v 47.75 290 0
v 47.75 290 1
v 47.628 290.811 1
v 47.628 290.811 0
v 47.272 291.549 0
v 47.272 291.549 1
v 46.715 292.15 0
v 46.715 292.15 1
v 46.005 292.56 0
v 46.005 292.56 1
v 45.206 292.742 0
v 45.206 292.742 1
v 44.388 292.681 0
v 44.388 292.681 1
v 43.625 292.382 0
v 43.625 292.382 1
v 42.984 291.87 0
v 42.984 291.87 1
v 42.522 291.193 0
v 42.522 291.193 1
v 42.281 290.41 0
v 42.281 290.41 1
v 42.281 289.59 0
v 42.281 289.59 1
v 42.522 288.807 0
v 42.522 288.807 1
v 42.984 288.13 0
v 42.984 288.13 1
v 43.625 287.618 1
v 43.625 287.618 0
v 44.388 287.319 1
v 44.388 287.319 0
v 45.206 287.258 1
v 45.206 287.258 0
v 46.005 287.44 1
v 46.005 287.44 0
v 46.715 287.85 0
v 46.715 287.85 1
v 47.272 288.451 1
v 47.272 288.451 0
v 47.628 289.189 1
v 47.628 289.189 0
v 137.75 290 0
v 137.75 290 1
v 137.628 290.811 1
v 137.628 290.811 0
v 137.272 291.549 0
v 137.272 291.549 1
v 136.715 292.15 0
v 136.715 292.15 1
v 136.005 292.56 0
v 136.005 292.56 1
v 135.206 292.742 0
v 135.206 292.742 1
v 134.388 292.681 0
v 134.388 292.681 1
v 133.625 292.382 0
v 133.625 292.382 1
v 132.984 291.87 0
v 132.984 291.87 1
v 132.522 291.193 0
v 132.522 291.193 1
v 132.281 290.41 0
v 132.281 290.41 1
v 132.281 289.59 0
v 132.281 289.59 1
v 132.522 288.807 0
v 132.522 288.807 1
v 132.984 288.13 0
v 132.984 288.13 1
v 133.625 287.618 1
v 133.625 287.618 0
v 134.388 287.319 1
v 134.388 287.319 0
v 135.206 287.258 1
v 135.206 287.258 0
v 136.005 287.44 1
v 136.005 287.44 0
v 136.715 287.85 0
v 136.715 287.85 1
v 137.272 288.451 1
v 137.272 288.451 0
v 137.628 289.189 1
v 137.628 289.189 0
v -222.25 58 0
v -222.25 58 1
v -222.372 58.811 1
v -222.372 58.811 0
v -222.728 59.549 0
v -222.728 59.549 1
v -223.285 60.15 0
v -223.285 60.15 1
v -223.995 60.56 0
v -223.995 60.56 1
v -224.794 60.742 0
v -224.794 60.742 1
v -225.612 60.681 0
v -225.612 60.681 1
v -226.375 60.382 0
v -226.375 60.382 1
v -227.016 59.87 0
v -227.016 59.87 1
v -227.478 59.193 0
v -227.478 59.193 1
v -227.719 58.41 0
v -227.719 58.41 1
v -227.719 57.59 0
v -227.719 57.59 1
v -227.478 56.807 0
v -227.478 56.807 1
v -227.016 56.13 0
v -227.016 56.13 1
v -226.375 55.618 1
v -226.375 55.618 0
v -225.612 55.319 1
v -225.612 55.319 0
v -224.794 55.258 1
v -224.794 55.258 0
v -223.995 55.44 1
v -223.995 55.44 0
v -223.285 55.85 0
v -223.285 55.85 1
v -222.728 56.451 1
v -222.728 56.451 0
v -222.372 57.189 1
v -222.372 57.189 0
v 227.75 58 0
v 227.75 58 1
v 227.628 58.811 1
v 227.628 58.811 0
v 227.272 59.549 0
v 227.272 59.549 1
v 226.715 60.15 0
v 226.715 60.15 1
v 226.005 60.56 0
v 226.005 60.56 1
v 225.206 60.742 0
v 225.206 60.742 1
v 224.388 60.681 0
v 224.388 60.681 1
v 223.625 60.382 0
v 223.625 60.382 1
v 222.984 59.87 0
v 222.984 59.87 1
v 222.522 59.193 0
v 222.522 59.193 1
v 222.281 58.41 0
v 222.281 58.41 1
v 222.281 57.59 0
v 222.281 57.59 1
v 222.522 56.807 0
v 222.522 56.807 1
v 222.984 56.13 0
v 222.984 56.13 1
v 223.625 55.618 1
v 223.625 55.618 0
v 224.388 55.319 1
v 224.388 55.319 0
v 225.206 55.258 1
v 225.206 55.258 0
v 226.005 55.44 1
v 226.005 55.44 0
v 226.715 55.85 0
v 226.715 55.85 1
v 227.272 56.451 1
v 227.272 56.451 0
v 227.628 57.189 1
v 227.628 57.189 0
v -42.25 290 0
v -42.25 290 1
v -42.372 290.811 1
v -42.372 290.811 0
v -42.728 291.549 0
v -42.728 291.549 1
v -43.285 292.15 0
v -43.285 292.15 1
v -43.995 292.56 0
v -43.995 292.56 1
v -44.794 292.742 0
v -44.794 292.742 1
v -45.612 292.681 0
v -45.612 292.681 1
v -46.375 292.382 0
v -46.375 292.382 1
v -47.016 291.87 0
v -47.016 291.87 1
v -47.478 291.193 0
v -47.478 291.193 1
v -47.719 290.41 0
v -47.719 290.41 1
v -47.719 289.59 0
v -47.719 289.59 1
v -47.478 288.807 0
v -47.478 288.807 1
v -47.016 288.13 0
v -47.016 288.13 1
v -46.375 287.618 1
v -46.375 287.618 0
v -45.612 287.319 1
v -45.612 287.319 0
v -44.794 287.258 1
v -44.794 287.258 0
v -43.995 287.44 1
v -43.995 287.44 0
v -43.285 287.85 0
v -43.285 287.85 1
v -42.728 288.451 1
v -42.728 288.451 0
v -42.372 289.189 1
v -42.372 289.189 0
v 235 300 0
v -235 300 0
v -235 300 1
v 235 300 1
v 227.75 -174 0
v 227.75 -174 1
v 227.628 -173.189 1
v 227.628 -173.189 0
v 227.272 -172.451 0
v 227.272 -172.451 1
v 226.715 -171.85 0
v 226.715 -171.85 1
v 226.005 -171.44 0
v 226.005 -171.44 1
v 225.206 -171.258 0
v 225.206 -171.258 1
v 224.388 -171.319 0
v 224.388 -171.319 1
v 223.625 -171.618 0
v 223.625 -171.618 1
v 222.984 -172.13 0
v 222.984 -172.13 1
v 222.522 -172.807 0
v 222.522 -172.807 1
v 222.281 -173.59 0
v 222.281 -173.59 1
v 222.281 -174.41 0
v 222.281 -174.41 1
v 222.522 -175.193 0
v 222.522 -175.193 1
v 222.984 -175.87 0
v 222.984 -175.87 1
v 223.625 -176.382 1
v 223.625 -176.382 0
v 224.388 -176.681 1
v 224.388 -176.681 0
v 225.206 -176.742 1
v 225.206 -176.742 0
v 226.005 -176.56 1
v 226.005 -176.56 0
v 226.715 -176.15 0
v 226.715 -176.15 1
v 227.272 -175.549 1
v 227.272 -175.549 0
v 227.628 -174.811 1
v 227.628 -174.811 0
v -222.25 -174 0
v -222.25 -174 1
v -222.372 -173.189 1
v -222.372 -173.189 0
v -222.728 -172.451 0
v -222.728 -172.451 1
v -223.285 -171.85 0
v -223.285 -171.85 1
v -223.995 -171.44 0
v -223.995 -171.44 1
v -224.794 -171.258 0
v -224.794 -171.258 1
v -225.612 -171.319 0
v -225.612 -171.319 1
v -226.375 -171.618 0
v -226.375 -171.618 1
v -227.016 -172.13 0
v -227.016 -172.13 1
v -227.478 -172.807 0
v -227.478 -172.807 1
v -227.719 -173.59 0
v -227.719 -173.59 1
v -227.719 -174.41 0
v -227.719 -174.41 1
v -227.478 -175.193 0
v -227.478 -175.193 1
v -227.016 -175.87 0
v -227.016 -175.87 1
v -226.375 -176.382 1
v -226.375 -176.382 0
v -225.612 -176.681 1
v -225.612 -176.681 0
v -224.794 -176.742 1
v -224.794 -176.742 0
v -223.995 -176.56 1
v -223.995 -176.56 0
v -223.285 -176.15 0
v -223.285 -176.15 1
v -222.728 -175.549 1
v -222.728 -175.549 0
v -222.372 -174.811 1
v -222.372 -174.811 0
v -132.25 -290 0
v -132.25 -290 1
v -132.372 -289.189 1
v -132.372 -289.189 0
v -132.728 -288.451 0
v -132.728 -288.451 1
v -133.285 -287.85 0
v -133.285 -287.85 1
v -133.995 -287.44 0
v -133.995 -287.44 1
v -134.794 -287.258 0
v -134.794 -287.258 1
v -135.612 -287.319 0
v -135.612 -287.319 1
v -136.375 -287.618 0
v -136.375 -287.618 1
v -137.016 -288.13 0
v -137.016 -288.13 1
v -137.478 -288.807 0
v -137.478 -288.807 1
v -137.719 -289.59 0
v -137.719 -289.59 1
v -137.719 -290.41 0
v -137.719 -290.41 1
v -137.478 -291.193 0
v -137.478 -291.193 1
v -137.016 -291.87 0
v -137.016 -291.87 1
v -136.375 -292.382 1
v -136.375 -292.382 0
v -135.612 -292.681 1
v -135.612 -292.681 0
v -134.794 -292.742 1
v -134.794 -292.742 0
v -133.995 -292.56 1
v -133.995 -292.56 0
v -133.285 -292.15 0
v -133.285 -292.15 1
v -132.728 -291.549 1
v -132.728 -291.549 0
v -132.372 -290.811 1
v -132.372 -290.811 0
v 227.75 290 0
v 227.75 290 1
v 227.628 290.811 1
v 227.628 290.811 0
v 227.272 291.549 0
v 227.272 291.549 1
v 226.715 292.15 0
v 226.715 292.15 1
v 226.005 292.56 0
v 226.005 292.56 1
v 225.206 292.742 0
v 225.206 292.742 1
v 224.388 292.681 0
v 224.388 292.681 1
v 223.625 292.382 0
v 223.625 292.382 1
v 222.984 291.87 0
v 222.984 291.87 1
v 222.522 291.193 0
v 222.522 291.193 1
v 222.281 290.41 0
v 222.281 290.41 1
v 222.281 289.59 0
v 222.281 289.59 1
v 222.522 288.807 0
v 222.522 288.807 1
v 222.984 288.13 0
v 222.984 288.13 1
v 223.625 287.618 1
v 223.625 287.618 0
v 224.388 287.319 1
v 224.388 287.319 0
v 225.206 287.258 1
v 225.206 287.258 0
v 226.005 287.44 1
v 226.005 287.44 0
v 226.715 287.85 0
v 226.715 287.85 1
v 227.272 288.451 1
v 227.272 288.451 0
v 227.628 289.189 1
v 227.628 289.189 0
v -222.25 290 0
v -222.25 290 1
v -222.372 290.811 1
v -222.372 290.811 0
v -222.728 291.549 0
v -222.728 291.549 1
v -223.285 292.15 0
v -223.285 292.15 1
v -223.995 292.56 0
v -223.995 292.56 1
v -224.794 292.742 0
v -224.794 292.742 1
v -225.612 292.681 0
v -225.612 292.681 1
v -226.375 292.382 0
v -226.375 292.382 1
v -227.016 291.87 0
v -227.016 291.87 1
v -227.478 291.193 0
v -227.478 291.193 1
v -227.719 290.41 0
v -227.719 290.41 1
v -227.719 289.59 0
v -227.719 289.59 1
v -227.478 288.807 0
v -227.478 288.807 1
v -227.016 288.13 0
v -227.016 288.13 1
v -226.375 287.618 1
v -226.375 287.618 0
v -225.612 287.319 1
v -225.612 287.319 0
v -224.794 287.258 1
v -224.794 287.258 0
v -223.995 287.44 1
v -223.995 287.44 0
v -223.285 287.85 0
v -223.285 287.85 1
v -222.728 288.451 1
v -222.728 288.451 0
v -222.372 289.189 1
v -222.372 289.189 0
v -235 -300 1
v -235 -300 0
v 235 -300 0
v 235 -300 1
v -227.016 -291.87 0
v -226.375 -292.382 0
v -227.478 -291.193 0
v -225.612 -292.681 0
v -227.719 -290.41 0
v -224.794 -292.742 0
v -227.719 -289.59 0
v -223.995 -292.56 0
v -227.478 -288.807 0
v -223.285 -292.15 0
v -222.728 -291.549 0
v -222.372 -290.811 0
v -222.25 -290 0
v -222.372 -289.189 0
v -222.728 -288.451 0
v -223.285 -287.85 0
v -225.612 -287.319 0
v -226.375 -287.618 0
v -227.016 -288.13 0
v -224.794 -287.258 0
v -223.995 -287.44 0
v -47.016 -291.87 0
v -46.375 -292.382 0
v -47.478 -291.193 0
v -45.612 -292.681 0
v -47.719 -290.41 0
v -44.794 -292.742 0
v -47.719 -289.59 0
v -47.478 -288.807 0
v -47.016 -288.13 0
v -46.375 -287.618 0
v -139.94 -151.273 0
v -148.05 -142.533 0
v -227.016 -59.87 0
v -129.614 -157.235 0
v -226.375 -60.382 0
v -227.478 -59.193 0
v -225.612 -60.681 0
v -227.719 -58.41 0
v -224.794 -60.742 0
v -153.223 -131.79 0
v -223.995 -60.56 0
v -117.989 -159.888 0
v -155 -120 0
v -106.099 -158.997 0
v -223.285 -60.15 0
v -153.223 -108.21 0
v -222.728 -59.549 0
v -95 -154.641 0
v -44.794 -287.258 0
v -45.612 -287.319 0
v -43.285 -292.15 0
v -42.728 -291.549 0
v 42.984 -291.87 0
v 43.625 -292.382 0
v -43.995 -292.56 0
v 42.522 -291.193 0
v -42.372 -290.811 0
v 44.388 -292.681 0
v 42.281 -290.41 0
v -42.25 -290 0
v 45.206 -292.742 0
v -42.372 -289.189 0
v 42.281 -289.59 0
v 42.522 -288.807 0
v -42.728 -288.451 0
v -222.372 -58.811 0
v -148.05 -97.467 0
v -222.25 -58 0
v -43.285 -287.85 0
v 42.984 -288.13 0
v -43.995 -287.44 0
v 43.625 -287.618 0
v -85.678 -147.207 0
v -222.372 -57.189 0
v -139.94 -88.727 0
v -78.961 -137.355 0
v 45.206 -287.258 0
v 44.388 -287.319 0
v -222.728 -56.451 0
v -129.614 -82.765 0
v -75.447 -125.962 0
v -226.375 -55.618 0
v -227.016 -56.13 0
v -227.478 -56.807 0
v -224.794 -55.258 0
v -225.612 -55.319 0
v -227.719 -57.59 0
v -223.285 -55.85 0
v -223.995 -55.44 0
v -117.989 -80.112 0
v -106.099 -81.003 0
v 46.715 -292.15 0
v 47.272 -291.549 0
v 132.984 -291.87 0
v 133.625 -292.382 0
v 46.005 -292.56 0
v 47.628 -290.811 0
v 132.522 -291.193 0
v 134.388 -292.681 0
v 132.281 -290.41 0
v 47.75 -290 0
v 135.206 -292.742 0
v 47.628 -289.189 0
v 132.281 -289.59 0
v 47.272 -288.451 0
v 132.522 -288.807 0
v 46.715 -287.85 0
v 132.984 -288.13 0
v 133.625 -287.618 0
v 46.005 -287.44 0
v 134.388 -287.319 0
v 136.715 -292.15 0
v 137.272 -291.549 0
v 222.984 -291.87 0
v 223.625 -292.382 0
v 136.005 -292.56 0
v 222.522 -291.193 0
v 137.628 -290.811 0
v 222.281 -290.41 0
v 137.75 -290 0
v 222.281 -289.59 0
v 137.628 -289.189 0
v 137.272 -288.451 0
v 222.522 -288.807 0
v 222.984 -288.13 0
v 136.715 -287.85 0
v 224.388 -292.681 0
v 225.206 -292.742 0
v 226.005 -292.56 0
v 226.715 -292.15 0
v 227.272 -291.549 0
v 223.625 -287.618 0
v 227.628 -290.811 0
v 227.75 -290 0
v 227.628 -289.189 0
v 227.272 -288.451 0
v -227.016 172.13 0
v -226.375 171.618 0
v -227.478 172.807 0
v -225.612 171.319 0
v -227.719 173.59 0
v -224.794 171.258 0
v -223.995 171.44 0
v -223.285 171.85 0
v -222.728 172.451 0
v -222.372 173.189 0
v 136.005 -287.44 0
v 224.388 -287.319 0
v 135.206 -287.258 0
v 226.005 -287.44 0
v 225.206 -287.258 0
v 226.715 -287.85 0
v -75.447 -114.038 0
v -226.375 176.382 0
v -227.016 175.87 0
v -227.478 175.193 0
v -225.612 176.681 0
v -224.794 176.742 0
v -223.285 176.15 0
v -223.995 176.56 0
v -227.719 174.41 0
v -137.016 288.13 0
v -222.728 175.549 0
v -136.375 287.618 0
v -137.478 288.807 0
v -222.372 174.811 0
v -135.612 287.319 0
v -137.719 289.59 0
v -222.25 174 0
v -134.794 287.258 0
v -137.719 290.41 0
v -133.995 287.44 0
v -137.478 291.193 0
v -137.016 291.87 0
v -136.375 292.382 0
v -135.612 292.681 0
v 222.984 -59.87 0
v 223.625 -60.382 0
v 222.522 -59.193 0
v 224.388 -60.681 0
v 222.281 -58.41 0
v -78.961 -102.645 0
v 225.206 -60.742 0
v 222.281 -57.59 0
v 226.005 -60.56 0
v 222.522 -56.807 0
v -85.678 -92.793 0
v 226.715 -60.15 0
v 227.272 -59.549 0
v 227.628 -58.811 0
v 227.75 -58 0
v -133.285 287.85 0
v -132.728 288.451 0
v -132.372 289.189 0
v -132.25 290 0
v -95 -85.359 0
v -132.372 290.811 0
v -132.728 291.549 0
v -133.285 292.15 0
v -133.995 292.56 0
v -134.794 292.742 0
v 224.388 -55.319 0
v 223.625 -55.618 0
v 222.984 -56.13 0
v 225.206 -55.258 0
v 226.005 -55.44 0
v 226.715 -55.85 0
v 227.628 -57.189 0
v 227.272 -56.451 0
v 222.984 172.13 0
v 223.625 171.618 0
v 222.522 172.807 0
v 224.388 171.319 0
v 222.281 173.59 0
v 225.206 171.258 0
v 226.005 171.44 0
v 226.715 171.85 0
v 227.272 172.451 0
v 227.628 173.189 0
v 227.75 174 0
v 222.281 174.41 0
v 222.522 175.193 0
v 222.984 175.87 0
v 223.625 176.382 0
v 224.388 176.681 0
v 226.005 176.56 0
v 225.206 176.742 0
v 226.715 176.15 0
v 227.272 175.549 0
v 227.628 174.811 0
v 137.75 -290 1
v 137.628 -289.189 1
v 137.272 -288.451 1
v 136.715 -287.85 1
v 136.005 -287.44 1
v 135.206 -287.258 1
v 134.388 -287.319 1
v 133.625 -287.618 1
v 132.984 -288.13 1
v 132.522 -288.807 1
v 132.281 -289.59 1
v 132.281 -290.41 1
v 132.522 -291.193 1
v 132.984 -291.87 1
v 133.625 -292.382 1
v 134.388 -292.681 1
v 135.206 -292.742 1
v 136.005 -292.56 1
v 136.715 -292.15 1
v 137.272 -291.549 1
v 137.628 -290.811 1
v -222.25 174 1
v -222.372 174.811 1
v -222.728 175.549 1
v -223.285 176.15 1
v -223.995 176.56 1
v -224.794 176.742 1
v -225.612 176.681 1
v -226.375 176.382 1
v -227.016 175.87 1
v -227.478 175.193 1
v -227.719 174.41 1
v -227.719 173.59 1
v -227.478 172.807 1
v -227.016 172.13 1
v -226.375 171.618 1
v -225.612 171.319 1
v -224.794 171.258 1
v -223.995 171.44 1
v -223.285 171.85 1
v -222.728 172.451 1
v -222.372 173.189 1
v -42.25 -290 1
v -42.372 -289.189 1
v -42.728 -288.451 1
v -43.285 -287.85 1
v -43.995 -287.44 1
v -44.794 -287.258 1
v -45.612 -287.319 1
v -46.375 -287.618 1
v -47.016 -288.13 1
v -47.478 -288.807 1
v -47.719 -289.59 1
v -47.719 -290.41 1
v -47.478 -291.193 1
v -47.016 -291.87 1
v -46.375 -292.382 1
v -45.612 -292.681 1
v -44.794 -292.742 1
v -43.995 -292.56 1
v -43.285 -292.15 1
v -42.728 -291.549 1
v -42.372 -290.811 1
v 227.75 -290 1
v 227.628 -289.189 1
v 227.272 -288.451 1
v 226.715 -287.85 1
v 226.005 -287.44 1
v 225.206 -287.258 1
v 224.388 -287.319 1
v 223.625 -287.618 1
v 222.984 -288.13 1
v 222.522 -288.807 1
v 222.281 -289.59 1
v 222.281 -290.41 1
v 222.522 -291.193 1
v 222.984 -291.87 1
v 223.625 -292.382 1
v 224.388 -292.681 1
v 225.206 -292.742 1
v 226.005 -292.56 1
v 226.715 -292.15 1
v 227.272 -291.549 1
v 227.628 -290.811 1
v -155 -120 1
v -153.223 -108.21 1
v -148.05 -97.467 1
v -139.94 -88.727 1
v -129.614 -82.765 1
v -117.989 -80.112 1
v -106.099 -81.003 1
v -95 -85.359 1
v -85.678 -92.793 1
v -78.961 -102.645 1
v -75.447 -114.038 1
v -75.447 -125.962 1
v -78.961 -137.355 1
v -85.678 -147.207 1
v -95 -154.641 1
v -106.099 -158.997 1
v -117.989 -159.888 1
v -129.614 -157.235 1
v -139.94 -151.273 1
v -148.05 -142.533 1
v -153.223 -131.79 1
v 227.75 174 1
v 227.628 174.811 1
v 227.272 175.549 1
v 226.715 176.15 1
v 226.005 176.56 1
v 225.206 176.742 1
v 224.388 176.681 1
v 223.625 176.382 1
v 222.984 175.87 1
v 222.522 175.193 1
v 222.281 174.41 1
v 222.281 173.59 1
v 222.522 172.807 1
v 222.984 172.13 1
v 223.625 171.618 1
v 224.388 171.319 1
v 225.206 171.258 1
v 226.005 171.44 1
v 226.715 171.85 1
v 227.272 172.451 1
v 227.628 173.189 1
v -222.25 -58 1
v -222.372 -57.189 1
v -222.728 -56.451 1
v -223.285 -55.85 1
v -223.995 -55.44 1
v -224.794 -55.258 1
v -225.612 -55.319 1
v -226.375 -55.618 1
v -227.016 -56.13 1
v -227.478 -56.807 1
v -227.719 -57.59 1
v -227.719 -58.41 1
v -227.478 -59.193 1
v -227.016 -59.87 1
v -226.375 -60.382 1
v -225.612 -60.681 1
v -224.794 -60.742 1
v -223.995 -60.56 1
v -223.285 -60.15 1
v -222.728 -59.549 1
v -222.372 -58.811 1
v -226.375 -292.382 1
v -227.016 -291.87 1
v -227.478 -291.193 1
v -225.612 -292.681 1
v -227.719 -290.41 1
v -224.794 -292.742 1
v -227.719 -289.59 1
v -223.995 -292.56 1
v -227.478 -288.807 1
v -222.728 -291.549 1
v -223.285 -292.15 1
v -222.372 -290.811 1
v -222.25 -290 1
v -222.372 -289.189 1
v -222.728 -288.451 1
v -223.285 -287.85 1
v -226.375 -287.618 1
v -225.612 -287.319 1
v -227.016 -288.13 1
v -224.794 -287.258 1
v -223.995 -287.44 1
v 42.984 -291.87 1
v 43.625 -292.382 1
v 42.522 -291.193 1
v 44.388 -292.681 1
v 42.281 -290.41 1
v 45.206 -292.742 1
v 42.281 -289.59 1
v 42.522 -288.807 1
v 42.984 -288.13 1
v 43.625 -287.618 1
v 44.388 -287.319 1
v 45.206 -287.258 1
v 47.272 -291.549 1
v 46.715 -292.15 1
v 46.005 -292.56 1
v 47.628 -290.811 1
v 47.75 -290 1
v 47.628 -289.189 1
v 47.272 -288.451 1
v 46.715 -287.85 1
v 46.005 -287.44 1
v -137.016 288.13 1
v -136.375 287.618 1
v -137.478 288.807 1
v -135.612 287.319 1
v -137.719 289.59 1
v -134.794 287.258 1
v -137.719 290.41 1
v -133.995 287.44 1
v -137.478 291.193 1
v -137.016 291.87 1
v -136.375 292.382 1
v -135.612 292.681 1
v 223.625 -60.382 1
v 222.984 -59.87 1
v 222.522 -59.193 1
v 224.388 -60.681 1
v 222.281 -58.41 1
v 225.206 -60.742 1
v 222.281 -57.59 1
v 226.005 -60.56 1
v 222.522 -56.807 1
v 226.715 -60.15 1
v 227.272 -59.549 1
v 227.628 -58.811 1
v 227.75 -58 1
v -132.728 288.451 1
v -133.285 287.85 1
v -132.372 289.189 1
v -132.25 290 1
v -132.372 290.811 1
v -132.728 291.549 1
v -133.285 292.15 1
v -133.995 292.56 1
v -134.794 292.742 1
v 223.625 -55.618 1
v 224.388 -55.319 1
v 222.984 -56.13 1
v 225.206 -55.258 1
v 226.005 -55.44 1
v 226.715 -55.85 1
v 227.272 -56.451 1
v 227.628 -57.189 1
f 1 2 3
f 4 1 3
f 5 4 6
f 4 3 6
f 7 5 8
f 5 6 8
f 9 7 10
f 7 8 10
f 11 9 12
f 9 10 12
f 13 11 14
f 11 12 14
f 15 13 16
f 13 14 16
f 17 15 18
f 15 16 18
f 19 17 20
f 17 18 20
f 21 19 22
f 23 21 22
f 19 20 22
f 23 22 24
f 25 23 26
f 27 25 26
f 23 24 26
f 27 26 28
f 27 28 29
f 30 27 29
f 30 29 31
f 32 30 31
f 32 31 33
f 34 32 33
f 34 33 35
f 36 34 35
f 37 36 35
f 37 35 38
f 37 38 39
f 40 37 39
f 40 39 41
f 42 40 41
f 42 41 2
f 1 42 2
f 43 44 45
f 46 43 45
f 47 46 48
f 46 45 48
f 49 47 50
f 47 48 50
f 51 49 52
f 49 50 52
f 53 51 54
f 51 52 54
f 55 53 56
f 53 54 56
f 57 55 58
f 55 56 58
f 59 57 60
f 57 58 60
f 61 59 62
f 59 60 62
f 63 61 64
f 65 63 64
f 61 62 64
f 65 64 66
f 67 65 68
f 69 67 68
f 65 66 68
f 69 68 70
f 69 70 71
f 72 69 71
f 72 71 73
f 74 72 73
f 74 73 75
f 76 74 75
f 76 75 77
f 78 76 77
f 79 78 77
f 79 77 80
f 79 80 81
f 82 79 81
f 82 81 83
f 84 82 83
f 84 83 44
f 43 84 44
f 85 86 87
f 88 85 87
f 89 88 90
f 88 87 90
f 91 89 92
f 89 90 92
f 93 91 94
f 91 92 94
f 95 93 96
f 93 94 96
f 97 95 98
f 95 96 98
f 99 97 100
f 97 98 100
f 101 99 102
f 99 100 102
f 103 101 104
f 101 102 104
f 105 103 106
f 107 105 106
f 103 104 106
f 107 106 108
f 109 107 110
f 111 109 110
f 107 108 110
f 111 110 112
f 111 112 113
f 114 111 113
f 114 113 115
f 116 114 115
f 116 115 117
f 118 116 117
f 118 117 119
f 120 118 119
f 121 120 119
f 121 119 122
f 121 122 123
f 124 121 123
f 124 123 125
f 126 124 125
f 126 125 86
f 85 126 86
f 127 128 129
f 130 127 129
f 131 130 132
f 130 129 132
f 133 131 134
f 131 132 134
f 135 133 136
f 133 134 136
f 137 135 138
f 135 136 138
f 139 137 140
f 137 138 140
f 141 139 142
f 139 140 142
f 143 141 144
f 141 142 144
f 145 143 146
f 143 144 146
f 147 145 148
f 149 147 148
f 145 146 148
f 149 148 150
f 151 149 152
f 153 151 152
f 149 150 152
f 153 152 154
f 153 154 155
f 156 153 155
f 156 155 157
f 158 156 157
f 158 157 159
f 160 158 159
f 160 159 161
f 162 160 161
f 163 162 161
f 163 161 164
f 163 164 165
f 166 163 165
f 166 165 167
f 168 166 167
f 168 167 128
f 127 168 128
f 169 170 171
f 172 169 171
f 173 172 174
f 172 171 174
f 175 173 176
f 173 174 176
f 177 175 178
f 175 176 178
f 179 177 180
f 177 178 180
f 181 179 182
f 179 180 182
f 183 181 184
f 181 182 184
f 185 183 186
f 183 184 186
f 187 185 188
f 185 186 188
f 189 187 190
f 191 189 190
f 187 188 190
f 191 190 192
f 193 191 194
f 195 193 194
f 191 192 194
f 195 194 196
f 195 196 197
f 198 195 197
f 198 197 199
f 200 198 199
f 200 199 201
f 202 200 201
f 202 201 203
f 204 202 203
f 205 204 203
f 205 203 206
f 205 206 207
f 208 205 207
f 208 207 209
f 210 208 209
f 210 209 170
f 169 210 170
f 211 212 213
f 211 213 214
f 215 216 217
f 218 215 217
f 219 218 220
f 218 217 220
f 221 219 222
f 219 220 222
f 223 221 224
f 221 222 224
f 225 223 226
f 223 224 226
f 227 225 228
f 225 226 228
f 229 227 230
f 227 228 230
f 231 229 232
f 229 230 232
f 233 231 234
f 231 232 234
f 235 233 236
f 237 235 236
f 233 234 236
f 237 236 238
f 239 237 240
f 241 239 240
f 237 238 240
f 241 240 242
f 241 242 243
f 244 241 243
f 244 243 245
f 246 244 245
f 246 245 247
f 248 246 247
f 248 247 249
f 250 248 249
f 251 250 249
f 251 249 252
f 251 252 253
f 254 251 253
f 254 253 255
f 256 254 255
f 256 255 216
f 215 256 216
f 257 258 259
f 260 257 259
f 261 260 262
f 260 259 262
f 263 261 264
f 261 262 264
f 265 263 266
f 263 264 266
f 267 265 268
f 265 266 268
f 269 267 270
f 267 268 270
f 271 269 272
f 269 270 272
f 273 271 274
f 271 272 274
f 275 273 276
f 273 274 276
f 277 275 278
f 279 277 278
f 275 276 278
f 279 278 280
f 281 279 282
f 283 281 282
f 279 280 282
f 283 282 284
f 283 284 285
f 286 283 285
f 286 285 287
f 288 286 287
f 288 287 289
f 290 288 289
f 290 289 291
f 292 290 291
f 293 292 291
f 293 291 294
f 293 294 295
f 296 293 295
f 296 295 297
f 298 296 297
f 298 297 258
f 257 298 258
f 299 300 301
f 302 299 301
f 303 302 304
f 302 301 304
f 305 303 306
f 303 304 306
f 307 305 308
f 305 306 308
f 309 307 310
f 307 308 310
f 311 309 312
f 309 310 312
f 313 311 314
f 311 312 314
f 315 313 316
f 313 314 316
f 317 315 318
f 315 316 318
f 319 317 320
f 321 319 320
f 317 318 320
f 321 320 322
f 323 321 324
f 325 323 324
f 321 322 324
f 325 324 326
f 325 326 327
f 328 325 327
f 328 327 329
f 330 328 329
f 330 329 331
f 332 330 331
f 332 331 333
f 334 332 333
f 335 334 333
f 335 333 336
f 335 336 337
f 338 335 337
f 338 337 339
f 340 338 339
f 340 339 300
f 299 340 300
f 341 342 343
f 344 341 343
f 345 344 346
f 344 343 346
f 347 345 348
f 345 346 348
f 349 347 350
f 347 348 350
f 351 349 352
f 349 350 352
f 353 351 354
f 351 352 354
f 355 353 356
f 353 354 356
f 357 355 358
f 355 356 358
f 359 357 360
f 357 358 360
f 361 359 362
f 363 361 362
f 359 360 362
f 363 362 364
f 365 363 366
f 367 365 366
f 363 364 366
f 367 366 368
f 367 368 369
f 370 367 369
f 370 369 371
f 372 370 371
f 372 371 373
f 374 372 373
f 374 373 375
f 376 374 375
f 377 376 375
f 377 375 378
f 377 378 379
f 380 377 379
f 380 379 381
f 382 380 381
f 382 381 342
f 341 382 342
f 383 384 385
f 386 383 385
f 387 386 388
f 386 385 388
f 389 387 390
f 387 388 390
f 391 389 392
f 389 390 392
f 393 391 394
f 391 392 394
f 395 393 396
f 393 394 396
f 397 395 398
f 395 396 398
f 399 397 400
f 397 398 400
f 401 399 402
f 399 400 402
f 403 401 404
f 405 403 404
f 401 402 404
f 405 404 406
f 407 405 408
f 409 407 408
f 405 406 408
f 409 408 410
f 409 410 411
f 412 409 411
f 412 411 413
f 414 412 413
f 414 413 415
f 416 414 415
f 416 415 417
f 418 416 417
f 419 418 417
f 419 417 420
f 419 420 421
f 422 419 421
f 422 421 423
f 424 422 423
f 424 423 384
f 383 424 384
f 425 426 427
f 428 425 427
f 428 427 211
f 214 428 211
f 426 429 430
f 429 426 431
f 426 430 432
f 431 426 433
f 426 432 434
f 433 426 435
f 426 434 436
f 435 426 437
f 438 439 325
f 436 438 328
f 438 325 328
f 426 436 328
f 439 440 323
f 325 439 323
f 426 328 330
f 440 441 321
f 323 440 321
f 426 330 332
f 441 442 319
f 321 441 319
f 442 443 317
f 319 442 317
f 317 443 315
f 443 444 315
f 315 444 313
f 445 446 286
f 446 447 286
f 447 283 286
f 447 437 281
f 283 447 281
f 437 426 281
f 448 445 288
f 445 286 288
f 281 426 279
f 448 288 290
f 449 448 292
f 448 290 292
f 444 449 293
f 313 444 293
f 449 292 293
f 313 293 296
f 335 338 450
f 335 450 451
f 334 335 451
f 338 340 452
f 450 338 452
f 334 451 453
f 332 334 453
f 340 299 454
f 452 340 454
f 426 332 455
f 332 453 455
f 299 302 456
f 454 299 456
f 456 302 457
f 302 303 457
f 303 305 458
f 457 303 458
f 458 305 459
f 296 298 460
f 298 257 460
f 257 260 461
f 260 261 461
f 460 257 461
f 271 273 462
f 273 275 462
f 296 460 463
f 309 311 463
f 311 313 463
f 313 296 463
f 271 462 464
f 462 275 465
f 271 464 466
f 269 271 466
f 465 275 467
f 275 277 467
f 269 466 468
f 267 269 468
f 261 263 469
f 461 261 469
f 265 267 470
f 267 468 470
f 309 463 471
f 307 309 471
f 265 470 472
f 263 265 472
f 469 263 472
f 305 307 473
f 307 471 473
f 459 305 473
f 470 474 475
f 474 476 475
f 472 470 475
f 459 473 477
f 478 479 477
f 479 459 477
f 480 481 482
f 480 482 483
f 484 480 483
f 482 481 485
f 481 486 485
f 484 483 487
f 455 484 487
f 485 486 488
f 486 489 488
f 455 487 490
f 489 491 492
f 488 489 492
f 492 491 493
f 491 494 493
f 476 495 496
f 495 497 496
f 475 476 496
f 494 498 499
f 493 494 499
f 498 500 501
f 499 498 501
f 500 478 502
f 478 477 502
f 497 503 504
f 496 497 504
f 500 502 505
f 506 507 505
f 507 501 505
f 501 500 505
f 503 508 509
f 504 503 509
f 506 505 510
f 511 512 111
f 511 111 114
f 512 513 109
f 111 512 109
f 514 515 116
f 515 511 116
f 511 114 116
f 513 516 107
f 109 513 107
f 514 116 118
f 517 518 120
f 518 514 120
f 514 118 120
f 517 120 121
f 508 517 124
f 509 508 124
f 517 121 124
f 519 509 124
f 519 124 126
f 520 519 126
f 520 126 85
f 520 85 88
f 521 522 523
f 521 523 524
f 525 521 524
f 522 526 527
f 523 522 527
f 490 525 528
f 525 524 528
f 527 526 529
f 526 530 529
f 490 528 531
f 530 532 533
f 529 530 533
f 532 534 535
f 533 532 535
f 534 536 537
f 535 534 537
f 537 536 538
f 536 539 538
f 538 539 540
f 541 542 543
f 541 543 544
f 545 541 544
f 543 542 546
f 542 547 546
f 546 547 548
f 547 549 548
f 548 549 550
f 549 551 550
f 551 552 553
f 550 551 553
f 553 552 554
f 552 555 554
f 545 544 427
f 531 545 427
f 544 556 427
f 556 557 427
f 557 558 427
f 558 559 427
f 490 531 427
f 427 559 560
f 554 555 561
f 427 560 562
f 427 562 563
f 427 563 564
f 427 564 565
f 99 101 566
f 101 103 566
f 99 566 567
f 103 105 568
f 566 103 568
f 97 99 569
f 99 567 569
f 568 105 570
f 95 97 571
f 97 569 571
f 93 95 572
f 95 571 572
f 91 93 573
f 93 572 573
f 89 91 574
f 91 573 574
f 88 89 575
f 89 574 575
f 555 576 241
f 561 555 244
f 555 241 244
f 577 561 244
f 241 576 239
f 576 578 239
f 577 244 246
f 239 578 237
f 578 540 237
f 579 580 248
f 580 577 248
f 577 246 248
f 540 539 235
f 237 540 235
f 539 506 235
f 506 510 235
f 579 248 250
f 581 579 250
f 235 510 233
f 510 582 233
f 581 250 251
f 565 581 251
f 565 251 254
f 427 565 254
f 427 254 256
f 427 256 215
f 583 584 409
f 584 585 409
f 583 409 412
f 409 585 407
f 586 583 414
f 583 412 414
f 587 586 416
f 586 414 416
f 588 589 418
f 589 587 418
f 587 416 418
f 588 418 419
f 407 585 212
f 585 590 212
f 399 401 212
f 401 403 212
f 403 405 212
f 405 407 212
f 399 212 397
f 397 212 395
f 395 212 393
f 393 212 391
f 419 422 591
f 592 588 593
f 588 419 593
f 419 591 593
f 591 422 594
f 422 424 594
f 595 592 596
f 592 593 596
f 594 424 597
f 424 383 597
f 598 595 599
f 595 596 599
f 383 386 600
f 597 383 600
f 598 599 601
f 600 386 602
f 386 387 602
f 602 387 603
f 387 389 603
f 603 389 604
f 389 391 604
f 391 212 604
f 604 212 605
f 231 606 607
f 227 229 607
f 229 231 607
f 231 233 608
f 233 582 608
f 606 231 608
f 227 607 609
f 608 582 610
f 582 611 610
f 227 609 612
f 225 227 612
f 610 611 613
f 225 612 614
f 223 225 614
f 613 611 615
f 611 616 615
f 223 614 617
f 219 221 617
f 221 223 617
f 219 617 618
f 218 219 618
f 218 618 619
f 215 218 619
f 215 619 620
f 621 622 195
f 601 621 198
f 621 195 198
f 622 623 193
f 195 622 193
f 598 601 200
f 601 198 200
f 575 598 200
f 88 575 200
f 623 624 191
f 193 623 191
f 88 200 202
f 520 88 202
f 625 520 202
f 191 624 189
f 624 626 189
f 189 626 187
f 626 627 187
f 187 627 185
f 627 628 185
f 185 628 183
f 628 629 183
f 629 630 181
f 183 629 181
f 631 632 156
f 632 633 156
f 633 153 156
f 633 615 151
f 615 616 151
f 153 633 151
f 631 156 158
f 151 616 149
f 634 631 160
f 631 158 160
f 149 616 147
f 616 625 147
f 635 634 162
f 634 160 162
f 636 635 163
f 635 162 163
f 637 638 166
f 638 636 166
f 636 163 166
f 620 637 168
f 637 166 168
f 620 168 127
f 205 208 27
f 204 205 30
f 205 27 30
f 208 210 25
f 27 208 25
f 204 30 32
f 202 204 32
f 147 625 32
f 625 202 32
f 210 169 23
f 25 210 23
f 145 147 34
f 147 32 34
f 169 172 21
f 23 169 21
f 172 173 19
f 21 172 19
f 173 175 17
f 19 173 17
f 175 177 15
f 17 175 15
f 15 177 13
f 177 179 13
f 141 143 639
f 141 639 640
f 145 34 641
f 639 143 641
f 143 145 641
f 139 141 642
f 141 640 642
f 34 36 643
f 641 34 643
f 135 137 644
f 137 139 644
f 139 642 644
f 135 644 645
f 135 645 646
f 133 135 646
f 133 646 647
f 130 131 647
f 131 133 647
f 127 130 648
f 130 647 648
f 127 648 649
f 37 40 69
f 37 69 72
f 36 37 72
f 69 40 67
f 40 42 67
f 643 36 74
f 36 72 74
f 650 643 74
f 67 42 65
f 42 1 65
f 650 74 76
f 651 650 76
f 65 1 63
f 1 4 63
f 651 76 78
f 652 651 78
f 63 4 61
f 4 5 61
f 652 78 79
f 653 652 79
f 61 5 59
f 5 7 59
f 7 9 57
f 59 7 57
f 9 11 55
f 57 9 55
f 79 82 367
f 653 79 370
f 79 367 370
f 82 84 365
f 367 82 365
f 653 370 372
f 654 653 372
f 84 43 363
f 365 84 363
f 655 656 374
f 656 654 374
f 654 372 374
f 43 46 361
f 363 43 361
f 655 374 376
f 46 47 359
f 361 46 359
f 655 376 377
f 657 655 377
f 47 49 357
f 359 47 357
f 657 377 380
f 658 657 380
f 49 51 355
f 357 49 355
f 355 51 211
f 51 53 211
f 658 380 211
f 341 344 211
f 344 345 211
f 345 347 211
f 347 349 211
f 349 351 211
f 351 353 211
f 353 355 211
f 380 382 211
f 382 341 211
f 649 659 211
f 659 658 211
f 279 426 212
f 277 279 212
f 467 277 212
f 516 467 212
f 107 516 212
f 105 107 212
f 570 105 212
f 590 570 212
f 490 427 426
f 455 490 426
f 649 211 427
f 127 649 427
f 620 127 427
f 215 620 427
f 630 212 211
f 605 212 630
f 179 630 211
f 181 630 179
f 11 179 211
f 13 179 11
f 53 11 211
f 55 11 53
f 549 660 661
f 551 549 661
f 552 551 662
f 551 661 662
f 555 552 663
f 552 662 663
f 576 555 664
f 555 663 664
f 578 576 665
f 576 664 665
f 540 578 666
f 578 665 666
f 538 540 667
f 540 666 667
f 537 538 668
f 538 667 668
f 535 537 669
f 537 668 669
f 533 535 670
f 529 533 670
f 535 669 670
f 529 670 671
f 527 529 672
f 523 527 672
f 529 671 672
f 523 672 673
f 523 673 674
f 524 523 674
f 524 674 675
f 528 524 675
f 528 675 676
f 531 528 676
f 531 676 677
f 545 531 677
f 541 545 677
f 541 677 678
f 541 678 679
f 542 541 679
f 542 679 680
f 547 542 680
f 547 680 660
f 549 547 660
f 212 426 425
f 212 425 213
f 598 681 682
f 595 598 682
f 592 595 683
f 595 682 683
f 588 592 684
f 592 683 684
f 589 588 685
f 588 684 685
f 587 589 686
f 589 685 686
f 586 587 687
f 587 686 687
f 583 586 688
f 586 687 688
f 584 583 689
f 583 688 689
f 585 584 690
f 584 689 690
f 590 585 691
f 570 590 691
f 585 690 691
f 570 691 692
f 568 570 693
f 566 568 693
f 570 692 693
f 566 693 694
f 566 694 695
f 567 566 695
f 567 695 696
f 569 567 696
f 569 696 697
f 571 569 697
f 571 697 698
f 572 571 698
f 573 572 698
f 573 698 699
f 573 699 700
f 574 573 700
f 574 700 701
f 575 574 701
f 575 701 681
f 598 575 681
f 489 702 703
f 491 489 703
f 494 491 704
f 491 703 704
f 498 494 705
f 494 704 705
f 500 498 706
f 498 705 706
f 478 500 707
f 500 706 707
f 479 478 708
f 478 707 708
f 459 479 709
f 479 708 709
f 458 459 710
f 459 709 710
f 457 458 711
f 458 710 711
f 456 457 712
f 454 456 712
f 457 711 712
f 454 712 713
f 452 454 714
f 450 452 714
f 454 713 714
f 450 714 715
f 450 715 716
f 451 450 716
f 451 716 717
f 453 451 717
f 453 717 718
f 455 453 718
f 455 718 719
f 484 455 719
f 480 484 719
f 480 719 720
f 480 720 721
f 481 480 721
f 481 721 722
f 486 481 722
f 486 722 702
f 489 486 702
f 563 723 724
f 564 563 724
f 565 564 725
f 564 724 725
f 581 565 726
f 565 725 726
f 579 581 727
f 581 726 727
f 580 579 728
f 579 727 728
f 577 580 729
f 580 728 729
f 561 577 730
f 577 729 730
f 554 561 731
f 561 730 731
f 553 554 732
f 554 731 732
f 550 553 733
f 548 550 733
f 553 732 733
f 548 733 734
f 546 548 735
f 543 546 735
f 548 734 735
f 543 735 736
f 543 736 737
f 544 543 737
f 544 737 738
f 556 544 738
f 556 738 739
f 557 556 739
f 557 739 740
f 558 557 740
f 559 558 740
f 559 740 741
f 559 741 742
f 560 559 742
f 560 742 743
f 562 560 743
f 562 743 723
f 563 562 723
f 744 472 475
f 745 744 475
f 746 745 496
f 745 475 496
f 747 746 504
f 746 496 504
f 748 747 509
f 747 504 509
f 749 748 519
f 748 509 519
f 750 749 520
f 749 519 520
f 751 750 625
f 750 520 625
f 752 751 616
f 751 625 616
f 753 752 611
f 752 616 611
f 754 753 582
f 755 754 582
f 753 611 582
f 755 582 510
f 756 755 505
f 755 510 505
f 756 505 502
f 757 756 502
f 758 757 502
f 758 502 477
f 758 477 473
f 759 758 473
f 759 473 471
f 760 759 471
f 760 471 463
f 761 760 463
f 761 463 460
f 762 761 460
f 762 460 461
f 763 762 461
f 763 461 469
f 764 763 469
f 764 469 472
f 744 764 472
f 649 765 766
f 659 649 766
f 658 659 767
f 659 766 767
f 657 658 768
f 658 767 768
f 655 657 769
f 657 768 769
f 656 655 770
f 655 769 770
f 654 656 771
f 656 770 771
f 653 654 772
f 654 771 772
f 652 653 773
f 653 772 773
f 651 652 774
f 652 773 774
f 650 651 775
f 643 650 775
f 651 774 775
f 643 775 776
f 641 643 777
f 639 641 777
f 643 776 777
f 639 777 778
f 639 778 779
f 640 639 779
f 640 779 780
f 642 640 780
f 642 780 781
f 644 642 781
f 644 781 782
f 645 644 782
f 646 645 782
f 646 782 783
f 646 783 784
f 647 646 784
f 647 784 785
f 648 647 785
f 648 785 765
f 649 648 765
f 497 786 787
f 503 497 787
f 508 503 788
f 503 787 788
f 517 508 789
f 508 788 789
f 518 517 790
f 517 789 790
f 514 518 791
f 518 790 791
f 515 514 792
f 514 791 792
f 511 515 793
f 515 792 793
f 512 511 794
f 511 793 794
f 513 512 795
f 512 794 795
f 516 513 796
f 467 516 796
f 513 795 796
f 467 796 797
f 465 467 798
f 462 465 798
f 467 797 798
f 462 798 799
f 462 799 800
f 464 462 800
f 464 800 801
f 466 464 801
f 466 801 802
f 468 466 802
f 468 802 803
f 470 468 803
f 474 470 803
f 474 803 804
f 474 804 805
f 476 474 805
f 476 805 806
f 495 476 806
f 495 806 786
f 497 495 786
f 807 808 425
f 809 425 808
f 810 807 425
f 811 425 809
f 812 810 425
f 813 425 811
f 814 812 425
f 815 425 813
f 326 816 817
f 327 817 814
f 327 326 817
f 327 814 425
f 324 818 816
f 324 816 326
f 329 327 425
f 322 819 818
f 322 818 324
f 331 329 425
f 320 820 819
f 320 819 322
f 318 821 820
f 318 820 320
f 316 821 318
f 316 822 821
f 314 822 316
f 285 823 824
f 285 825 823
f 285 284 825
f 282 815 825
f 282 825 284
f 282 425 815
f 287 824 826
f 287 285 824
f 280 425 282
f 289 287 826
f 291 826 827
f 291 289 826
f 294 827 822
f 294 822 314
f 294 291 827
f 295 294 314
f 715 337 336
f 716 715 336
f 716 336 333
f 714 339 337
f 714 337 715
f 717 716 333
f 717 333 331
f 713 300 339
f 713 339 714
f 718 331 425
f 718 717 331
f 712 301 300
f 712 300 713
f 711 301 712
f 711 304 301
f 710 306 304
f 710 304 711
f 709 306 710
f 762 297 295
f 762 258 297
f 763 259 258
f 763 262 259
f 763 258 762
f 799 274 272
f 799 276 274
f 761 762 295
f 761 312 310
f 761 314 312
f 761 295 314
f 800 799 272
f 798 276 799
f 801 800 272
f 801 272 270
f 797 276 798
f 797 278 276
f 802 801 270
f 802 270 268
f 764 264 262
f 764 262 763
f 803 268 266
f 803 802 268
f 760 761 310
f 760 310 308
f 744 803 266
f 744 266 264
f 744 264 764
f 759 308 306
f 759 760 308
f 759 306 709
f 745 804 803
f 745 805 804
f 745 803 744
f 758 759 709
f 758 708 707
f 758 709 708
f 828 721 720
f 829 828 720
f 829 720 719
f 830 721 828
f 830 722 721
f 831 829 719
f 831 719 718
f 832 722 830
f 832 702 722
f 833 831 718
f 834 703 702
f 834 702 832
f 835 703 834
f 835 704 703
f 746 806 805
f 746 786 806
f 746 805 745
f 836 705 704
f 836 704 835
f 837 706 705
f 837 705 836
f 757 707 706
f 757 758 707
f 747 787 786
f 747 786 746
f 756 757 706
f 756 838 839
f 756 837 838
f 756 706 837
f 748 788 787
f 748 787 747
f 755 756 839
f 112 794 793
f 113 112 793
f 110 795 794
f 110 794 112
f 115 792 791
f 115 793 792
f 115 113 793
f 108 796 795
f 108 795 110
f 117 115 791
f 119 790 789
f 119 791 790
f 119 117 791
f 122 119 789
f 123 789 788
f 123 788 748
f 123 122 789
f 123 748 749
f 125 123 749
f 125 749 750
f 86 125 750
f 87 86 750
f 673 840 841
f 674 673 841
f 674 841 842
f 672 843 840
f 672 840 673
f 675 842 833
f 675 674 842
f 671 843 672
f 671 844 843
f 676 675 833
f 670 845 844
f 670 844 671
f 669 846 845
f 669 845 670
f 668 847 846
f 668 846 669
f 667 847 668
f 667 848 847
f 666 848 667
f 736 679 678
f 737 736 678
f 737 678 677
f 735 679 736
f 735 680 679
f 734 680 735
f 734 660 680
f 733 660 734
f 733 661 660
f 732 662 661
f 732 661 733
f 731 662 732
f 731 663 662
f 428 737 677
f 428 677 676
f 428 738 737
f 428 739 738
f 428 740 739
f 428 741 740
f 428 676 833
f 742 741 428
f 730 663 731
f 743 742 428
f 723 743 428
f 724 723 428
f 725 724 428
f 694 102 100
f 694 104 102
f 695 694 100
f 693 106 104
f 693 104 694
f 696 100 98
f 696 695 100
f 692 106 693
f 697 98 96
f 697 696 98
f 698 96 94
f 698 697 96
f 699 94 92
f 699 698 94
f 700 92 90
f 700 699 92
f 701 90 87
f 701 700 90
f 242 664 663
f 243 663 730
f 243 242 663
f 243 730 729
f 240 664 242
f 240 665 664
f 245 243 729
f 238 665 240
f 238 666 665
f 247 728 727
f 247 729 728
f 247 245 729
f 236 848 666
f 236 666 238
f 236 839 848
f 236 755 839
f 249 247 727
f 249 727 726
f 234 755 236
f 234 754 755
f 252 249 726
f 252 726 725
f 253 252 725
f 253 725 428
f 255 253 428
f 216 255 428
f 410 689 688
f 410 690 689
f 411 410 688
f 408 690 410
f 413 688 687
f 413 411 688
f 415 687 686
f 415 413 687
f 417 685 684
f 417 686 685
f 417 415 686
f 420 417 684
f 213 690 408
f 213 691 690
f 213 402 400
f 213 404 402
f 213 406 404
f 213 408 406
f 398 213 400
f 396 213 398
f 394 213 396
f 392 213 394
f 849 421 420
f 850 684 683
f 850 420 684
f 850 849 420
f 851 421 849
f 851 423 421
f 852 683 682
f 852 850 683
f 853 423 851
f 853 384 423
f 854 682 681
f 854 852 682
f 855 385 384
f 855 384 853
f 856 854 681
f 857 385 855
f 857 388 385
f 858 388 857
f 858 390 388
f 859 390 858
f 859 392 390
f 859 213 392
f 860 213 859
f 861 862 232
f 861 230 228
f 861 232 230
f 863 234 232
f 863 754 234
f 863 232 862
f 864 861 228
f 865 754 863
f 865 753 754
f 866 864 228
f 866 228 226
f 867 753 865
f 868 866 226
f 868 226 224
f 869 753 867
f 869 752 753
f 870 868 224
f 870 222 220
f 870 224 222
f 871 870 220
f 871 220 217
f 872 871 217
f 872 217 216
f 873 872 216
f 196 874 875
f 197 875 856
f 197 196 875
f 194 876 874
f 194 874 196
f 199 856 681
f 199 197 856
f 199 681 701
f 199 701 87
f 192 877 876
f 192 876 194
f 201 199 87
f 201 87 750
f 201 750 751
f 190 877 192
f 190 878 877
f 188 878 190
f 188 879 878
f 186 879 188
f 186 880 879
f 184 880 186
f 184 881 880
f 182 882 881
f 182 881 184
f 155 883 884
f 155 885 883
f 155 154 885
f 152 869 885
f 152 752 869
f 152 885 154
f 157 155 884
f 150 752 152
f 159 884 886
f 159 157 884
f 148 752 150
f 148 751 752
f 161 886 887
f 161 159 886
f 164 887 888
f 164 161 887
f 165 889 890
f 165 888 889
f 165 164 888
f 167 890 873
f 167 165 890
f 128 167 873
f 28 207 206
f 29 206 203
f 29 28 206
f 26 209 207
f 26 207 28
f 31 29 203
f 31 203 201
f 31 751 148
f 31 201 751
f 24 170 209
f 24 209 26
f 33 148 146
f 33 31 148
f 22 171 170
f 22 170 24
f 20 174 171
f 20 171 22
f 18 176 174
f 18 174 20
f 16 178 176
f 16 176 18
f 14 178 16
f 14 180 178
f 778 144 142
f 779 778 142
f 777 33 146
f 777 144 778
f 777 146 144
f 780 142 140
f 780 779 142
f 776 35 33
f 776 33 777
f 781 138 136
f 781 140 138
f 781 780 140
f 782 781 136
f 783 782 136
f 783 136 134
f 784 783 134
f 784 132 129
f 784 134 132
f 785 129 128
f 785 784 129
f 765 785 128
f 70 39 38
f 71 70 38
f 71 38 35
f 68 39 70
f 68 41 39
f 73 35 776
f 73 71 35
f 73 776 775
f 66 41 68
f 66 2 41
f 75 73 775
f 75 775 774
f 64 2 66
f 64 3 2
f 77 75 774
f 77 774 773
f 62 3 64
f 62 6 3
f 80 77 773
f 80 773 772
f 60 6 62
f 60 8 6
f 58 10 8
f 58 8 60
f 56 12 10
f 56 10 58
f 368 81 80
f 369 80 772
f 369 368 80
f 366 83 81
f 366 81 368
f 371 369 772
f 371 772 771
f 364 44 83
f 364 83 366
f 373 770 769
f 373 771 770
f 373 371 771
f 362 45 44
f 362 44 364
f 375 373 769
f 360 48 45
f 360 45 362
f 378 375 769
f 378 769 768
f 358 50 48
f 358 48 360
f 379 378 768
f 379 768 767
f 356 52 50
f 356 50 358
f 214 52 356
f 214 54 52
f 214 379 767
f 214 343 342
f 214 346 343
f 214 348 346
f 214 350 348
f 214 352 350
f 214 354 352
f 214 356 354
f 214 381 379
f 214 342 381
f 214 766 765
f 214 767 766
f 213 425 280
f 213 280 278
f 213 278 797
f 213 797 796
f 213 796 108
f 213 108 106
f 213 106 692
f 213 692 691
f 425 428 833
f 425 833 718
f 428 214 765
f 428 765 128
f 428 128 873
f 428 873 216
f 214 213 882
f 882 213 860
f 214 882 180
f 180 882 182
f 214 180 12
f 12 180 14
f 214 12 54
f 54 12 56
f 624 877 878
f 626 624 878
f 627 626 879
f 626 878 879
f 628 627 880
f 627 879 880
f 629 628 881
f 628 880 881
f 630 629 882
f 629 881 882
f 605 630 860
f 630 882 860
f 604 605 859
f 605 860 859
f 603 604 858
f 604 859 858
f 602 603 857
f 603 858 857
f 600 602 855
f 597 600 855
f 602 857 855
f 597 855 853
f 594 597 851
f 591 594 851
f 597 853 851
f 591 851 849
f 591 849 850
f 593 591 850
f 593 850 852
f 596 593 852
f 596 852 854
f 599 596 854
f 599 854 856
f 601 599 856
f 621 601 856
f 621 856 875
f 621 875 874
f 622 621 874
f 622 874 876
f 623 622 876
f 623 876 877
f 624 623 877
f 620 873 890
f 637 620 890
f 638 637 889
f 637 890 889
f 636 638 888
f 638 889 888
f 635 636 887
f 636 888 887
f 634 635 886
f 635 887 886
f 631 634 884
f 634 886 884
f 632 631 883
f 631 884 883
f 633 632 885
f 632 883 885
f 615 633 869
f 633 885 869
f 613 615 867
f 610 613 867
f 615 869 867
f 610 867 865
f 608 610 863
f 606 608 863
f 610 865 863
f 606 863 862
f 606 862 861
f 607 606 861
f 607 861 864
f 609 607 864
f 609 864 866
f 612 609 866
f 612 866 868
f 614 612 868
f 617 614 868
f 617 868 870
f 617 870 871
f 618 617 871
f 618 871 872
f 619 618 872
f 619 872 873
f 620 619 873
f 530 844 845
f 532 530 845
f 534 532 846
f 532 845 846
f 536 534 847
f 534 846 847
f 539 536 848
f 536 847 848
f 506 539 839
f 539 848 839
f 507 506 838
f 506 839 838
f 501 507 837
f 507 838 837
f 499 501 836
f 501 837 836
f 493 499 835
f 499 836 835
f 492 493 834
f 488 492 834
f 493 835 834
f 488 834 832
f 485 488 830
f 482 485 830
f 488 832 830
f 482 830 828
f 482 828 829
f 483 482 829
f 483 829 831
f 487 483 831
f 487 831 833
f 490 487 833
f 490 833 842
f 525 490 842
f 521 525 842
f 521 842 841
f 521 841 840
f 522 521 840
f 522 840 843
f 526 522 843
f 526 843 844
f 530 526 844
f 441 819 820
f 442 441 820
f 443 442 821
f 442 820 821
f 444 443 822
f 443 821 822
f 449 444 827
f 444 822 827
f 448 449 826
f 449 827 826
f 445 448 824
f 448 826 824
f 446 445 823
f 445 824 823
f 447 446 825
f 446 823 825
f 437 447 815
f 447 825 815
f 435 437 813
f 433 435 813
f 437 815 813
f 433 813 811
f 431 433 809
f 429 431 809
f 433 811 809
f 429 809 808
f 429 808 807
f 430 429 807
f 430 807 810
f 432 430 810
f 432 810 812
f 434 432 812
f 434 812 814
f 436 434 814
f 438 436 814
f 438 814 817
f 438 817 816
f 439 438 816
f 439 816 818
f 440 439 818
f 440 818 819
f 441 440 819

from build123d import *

# Parameters (mm, degrees)
SKETCH_1_W          = 470
SKETCH_1_H          = 600
EXTRUDE_1_DEPTH     = 1
HOLE_WIZARD_M5_1_D  = 5.5
SKETCH_4_R          = 40
CUT_EXTRUDE_1_DEPTH = 10


with BuildPart() as part:
    # 스케치1 → 보스-돌출1 (new body)
    with BuildSketch(Plane.XY):
        Rectangle(SKETCH_1_W, SKETCH_1_H)
    extrude(amount=EXTRUDE_1_DEPTH)

    # M5 여유 구멍1 (through all)
    with Locations(Plane(origin=(0, 0, 0), x_dir=(-1, 0, 0), z_dir=(0, 0, -1))):
        with Locations((-225, 290), (-135, 290), (-45, 290), (45, 290), (135, 290), (225, 290), (225, 174), (225, 58), (225, -58), (225, -174), (225, -290), (-225, 174), (-225, 58), (-225, -58), (-225, -174), (-225, -290), (-135, -290), (-45, -290), (45, -290), (135, -290)):
            Hole(HOLE_WIZARD_M5_1_D / 2)

    # 스케치4 → 컷-돌출1 (cut)
    with BuildSketch(Plane(origin=(0, 0, 0), x_dir=(-1, 0, 0), z_dir=(0, 0, -1))):
        with Locations((115, -120)):
            Circle(SKETCH_4_R)
    extrude(amount=-CUT_EXTRUDE_1_DEPTH, mode=Mode.SUBTRACT)


solid = part.part
